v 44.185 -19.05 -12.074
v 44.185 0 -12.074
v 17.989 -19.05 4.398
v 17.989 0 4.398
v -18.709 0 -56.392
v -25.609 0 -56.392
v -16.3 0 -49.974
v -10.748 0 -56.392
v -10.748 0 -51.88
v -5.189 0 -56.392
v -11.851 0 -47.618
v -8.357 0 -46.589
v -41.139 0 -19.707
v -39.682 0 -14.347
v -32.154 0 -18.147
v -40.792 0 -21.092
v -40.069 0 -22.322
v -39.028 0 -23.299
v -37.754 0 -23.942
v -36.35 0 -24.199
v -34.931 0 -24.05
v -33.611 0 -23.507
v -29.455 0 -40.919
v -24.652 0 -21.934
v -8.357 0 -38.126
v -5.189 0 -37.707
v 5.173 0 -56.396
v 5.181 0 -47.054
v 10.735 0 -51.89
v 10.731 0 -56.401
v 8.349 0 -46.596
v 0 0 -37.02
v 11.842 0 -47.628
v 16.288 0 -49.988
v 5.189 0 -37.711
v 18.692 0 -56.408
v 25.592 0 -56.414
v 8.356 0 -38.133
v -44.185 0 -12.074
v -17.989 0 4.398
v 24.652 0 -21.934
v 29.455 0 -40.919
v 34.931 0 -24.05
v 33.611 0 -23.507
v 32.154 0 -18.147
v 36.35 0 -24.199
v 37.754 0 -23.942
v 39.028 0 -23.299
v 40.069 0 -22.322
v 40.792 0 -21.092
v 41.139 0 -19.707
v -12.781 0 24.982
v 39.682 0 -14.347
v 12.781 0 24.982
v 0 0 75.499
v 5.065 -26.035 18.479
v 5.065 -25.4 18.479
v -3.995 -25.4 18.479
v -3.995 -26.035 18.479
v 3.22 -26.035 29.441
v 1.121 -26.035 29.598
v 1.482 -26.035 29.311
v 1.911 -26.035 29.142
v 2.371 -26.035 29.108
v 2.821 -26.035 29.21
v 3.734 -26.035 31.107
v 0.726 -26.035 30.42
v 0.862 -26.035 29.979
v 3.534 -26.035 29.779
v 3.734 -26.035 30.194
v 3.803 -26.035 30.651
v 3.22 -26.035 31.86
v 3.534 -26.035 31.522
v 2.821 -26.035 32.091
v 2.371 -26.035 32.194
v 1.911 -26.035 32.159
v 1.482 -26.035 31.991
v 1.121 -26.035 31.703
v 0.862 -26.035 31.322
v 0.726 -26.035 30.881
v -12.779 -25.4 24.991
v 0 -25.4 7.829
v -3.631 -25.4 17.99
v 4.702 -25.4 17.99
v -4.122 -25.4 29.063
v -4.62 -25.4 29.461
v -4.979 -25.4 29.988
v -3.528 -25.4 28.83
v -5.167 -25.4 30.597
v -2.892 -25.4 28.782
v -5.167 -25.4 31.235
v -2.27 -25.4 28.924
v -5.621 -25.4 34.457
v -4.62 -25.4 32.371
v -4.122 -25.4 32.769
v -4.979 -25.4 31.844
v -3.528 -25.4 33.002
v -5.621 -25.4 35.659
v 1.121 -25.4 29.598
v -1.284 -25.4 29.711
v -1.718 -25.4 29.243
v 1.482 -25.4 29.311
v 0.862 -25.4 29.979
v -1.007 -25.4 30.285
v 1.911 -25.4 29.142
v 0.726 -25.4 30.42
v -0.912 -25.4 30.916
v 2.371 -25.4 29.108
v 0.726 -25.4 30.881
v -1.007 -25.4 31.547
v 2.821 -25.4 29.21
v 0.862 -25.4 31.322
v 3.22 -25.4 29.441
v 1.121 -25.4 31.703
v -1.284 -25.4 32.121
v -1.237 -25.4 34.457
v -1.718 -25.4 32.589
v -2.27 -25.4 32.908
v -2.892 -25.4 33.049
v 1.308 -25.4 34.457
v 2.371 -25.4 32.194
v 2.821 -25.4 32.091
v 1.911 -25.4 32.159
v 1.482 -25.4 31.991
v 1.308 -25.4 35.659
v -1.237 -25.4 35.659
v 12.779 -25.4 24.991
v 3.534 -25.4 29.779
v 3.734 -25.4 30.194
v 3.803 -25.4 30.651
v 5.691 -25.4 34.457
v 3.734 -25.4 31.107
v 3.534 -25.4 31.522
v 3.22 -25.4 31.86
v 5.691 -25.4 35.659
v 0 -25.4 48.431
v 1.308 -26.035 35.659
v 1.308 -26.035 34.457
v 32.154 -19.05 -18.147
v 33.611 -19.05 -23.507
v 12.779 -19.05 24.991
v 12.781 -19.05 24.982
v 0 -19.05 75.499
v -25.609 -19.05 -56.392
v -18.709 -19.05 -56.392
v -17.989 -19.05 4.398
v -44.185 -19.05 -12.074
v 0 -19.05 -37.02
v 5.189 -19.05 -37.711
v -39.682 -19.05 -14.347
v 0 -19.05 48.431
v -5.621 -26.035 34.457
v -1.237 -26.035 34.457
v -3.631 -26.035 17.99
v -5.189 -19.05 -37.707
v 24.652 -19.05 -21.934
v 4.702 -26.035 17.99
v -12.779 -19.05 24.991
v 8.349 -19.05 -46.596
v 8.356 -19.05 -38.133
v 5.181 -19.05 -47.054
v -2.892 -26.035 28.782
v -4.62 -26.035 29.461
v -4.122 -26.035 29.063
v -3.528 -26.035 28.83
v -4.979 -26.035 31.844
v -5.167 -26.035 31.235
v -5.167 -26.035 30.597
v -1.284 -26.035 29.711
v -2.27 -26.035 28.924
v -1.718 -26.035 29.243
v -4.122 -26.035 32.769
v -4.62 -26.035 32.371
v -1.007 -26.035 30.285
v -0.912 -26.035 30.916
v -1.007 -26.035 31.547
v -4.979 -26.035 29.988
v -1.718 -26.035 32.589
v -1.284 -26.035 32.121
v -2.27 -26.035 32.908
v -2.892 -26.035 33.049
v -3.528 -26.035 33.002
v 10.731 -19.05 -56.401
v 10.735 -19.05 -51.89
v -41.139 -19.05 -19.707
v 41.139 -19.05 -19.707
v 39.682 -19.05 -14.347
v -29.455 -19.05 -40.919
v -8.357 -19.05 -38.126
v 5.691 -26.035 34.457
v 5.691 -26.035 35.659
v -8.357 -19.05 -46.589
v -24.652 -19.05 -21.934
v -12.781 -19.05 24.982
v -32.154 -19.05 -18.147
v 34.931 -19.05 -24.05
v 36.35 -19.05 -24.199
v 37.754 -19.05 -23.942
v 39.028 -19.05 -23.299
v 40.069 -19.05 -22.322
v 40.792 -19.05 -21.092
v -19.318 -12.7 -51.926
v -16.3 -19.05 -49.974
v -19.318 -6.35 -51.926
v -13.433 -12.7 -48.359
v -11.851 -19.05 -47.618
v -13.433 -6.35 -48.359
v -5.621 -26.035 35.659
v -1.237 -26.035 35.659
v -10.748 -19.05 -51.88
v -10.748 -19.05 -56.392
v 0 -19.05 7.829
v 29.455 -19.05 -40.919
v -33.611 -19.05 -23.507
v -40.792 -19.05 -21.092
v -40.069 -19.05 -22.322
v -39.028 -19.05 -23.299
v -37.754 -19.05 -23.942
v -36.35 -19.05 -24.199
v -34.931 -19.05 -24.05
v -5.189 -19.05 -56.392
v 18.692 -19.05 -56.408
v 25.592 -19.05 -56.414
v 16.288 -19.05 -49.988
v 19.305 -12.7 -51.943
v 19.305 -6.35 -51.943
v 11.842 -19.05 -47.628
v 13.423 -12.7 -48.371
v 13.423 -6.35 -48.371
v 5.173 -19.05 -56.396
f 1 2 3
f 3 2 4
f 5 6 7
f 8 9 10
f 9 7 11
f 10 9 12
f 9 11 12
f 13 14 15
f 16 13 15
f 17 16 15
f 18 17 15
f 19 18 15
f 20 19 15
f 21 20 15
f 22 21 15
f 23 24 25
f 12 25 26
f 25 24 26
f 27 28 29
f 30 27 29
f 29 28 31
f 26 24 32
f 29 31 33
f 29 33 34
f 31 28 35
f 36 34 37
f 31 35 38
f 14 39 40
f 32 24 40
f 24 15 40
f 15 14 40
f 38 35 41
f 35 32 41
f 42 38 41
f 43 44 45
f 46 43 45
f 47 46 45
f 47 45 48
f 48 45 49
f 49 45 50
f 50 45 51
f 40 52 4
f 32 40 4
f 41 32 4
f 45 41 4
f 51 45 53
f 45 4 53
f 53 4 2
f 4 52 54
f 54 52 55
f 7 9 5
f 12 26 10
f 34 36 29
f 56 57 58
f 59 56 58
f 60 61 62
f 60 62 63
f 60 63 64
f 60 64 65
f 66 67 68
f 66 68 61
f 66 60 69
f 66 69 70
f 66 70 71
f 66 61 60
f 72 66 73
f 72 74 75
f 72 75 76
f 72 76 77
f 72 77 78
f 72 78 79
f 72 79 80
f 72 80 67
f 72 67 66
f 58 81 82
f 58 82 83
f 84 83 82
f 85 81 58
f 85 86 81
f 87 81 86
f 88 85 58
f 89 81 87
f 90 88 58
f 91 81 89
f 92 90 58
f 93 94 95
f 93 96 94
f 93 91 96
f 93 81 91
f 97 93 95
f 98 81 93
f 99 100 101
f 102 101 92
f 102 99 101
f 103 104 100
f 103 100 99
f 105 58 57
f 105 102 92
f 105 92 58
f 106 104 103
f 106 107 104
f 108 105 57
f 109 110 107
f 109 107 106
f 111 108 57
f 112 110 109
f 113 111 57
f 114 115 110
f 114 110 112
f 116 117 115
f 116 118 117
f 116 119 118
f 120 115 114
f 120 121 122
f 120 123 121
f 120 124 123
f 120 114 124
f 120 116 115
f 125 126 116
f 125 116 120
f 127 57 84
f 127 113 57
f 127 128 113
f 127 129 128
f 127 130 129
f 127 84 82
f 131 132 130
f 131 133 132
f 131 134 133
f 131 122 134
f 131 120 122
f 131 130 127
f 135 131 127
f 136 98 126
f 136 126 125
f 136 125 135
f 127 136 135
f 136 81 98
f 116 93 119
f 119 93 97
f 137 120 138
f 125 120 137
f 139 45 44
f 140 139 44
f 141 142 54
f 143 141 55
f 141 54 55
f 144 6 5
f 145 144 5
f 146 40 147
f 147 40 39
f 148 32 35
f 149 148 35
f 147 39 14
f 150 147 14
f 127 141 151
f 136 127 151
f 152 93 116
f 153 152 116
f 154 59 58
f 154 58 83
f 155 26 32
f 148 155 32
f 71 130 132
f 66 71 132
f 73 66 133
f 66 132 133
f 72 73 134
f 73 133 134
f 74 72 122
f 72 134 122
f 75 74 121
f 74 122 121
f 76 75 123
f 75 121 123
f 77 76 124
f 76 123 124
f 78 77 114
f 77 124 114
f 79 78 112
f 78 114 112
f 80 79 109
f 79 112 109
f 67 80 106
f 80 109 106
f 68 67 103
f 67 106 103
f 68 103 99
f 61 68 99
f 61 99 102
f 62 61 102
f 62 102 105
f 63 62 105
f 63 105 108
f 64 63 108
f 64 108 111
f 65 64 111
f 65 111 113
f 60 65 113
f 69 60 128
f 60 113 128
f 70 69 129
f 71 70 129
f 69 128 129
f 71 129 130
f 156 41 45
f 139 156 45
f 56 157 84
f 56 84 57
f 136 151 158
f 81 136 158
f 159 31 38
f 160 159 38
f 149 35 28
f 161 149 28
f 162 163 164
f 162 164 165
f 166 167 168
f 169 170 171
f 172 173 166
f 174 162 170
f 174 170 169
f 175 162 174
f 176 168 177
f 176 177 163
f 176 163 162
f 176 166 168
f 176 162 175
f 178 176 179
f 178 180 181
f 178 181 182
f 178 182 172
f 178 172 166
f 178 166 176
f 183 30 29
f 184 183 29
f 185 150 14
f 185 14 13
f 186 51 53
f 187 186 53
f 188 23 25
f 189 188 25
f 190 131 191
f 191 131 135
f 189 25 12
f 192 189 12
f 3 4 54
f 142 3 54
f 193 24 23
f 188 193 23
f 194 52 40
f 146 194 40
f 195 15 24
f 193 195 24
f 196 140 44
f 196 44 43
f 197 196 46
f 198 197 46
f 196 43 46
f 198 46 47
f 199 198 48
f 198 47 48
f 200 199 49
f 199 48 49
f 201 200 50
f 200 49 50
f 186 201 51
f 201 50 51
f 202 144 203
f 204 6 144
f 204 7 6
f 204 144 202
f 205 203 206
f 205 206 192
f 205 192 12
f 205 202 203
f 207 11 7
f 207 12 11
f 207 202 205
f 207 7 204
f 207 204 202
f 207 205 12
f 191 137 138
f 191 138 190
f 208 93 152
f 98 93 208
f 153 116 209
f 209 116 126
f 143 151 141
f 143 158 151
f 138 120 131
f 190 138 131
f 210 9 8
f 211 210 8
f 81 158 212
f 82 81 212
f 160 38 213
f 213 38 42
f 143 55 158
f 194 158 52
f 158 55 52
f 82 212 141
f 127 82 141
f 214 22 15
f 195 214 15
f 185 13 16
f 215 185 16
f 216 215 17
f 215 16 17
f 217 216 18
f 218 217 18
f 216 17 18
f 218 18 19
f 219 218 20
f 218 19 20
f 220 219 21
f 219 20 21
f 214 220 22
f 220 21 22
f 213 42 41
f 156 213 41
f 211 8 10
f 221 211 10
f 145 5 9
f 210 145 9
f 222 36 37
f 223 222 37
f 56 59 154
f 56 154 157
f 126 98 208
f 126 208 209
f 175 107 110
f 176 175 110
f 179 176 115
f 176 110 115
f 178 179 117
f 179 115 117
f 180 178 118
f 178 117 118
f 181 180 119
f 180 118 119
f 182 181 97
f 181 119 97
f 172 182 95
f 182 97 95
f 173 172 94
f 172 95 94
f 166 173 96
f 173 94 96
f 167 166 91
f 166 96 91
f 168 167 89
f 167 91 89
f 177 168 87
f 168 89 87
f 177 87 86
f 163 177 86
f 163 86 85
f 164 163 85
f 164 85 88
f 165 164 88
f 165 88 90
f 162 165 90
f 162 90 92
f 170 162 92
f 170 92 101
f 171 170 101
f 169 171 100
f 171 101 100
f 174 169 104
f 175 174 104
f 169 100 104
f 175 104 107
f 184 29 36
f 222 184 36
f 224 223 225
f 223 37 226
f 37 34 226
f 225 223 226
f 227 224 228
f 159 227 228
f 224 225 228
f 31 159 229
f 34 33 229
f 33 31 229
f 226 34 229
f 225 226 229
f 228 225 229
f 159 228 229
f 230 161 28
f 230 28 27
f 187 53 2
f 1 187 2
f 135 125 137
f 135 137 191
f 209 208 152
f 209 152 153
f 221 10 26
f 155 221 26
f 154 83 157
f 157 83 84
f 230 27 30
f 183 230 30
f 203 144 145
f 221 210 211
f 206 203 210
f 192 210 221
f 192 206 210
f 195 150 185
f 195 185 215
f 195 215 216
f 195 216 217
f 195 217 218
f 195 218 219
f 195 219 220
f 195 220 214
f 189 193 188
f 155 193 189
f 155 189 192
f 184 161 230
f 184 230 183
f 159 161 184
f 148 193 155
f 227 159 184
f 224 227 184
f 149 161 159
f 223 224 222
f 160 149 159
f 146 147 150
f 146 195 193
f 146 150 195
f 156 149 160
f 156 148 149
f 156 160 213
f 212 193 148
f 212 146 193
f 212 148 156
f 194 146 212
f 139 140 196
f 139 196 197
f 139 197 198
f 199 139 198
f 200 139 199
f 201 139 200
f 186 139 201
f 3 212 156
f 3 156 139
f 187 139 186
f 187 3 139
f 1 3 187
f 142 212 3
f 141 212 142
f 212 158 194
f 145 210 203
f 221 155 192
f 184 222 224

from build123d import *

# Parameters (mm, degrees)
F1_DEPTH = 19.05
F3_DEPTH = 6.35
F4_R     = 2.1395052033
F4_R_2   = 1.5473789097
F4_W     = 4.3834099779
F4_H     = 1.2019015849
F5_DEPTH = 0.635


with BuildPart() as f1:
    # F0 (on Front) → F1 (new body)
    with BuildSketch(Plane.XZ):
        Polygon((12.7812118899, 24.9824322697), (0, 75.4986554384), (-12.7812118899, 24.9824322697), (-17.9893098468, 4.3980431727), (17.9893098468, 4.3980431727), align=None)
        with BuildLine():
            Line((17.9893098468, 4.3980431727), (-17.9893098468, 4.3980431727))
            Line((-17.9893098468, 4.3980431727), (-44.1846288741, -12.0744779706))
            Line((-44.1846288741, -12.0744779706), (-39.6815885197, -14.3474328787))
            Line((-39.6815885197, -14.3474328787), (-41.1387868226, -19.7073649615))
            ThreePointArc((-41.1387868226, -19.7073649615), (-38.4139838362, -23.6659590485), (-33.6108808251, -23.5071512254))
            Line((-33.6108808251, -23.5071512254), (-32.1536825222, -18.1472191426))
            Line((-32.1536825222, -18.1472191426), (-24.6516230519, -21.933959112))
            Line((-24.6516230519, -21.933959112), (-29.4550578464, -40.9189650839))
            Line((-29.4550578464, -40.9189650839), (-8.3569039417, -38.1258840272))
            Line((-8.3569039417, -38.1258840272), (-8.3569039417, -46.5887725028))
            add(Edge.make_bspline(
                [(-8.3569039417, -46.5887725028), (-7.1639467181, -46.4381227358), (-6.0970060344, -46.567074298), (-5.1892242436, -47.0491623459)],
                knots=[0.3623606656, 0.3623606656, 0.3623606656, 0.3623606656, 0.4576615295, 0.4576615295, 0.4576615295, 0.4576615295], degree=3))
            Line((-5.1892242436, -47.0491623459), (-5.1892242436, -37.7065304572))
            Line((-5.1892242436, -37.7065304572), (0, -37.0195545256))
            Line((0, -37.0195545256), (5.1886305738, -37.7110000757))
            Line((5.1886305738, -37.7110000757), (5.1805830548, -47.0536284984))
            add(Edge.make_bspline(
                [(8.3486581466, -46.5959673895), (7.1558311316, -46.4442900935), (6.0887797679, -46.5723225708), (5.1805830548, -47.0536284984)],
                knots=[0.3623606656, 0.3623606656, 0.3623606656, 0.3623606656, 0.4576615295, 0.4576615295, 0.4576615295, 0.4576615295], degree=3))
            Line((8.3486581466, -46.5959673895), (8.3559478758, -38.1330820534))
            Line((8.3559478758, -38.1330820534), (29.4550578464, -40.9189650839))
            Line((29.4550578464, -40.9189650839), (24.6516230519, -21.933959112))
            Line((24.6516230519, -21.933959112), (32.1536825222, -18.1472191426))
            Line((32.1536825222, -18.1472191426), (33.6108808251, -23.5071512254))
            ThreePointArc((33.6108808251, -23.5071512254), (38.4139838362, -23.6659590485), (41.1387868226, -19.7073649615))
            Line((41.1387868226, -19.7073649615), (39.6815885197, -14.3474328787))
            Line((39.6815885197, -14.3474328787), (44.1846288741, -12.0744779706))
            Line((44.1846288741, -12.0744779706), (17.9893098468, 4.3980431727))
        make_face()
        with BuildLine():
            add(Edge.make_bspline(
                [(-8.3569039417, -46.5887725028), (-7.1639467181, -46.4381227358), (-6.0970060344, -46.567074298), (-5.1892242436, -47.0491623459)],
                knots=[0.3623606656, 0.3623606656, 0.3623606656, 0.3623606656, 0.4576615295, 0.4576615295, 0.4576615295, 0.4576615295], degree=3))
            add(Edge.make_bspline(
                [(-25.6085079163, -56.3917942345), (-19.2506852316, -51.7766897434), (-12.8928625468, -47.1615852522), (-8.3569039417, -46.5887725028)],
                knots=[0, 0, 0, 0, 0.3623606656, 0.3623606656, 0.3623606656, 0.3623606656], degree=3))
            Line((-25.6085079163, -56.3917942345), (-18.7088064849, -56.3917942345))
            Line((-18.7088064849, -56.3917942345), (-10.747612454, -51.8804490566))
            Line((-10.747612454, -51.8804490566), (-10.747612454, -56.3917942345))
            Line((-10.747612454, -56.3917942345), (-5.1892242436, -56.3917942345))
            Line((-5.1892242436, -56.3917942345), (-5.1892242436, -47.0491623459))
        make_face()
        with BuildLine():
            add(Edge.make_bspline(
                [(25.5918116332, -56.4138456024), (19.2379666475, -51.7932663474), (12.8841216618, -47.1726870923), (8.3486581466, -46.5959673895)],
                knots=[0, 0, 0, 0, 0.3623606656, 0.3623606656, 0.3623606656, 0.3623606656], degree=3))
            add(Edge.make_bspline(
                [(8.3486581466, -46.5959673895), (7.1558311316, -46.4442900935), (6.0887797679, -46.5723225708), (5.1805830548, -47.0536284984)],
                knots=[0.3623606656, 0.3623606656, 0.3623606656, 0.3623606656, 0.4576615295, 0.4576615295, 0.4576615295, 0.4576615295], degree=3))
            Line((5.1805830548, -47.0536284984), (5.1725355357, -56.396256921))
            Line((5.1725355357, -56.396256921), (10.730921684, -56.4010447834))
            Line((10.730921684, -56.4010447834), (10.7348076486, -51.8897012791))
            Line((10.7348076486, -51.8897012791), (18.6921127615, -56.407902365))
            Line((18.6921127615, -56.407902365), (25.5918116332, -56.4138456024))
        make_face()
    extrude(amount=F1_DEPTH)

    # F2 (on face) → F3 (join)
    with BuildSketch(Plane.XZ.offset(19.05)):
        Polygon((12.7791271915, 24.9906717928), (0, 48.4305992723), (-12.7791271915, 24.9906717928), (0, 7.8285075724), align=None)
    extrude(amount=F3_DEPTH)

    # F4 (on face) → F5 (join)
    with BuildSketch(Plane.XZ.offset(25.4)):
        with Locations((-3.0517904088, 30.9159699827)):
            Circle(F4_R)
        with Locations((2.2556707263, 30.6505970657)):
            Circle(F4_R_2)
        Polygon((5.0654464612, 18.4789821506), (-3.9945594035, 18.4789821506), (-3.6306733055, 17.9902889184), (4.7015603632, 17.9902889184), align=None)
        with Locations((-3.4289575997, 35.0581686944)):
            Rectangle(F4_W, F4_H)
        with Locations((3.4996584873, 35.0581686944)):
            Rectangle(F4_W, F4_H)
    extrude(amount=F5_DEPTH)


solid = f1.part
